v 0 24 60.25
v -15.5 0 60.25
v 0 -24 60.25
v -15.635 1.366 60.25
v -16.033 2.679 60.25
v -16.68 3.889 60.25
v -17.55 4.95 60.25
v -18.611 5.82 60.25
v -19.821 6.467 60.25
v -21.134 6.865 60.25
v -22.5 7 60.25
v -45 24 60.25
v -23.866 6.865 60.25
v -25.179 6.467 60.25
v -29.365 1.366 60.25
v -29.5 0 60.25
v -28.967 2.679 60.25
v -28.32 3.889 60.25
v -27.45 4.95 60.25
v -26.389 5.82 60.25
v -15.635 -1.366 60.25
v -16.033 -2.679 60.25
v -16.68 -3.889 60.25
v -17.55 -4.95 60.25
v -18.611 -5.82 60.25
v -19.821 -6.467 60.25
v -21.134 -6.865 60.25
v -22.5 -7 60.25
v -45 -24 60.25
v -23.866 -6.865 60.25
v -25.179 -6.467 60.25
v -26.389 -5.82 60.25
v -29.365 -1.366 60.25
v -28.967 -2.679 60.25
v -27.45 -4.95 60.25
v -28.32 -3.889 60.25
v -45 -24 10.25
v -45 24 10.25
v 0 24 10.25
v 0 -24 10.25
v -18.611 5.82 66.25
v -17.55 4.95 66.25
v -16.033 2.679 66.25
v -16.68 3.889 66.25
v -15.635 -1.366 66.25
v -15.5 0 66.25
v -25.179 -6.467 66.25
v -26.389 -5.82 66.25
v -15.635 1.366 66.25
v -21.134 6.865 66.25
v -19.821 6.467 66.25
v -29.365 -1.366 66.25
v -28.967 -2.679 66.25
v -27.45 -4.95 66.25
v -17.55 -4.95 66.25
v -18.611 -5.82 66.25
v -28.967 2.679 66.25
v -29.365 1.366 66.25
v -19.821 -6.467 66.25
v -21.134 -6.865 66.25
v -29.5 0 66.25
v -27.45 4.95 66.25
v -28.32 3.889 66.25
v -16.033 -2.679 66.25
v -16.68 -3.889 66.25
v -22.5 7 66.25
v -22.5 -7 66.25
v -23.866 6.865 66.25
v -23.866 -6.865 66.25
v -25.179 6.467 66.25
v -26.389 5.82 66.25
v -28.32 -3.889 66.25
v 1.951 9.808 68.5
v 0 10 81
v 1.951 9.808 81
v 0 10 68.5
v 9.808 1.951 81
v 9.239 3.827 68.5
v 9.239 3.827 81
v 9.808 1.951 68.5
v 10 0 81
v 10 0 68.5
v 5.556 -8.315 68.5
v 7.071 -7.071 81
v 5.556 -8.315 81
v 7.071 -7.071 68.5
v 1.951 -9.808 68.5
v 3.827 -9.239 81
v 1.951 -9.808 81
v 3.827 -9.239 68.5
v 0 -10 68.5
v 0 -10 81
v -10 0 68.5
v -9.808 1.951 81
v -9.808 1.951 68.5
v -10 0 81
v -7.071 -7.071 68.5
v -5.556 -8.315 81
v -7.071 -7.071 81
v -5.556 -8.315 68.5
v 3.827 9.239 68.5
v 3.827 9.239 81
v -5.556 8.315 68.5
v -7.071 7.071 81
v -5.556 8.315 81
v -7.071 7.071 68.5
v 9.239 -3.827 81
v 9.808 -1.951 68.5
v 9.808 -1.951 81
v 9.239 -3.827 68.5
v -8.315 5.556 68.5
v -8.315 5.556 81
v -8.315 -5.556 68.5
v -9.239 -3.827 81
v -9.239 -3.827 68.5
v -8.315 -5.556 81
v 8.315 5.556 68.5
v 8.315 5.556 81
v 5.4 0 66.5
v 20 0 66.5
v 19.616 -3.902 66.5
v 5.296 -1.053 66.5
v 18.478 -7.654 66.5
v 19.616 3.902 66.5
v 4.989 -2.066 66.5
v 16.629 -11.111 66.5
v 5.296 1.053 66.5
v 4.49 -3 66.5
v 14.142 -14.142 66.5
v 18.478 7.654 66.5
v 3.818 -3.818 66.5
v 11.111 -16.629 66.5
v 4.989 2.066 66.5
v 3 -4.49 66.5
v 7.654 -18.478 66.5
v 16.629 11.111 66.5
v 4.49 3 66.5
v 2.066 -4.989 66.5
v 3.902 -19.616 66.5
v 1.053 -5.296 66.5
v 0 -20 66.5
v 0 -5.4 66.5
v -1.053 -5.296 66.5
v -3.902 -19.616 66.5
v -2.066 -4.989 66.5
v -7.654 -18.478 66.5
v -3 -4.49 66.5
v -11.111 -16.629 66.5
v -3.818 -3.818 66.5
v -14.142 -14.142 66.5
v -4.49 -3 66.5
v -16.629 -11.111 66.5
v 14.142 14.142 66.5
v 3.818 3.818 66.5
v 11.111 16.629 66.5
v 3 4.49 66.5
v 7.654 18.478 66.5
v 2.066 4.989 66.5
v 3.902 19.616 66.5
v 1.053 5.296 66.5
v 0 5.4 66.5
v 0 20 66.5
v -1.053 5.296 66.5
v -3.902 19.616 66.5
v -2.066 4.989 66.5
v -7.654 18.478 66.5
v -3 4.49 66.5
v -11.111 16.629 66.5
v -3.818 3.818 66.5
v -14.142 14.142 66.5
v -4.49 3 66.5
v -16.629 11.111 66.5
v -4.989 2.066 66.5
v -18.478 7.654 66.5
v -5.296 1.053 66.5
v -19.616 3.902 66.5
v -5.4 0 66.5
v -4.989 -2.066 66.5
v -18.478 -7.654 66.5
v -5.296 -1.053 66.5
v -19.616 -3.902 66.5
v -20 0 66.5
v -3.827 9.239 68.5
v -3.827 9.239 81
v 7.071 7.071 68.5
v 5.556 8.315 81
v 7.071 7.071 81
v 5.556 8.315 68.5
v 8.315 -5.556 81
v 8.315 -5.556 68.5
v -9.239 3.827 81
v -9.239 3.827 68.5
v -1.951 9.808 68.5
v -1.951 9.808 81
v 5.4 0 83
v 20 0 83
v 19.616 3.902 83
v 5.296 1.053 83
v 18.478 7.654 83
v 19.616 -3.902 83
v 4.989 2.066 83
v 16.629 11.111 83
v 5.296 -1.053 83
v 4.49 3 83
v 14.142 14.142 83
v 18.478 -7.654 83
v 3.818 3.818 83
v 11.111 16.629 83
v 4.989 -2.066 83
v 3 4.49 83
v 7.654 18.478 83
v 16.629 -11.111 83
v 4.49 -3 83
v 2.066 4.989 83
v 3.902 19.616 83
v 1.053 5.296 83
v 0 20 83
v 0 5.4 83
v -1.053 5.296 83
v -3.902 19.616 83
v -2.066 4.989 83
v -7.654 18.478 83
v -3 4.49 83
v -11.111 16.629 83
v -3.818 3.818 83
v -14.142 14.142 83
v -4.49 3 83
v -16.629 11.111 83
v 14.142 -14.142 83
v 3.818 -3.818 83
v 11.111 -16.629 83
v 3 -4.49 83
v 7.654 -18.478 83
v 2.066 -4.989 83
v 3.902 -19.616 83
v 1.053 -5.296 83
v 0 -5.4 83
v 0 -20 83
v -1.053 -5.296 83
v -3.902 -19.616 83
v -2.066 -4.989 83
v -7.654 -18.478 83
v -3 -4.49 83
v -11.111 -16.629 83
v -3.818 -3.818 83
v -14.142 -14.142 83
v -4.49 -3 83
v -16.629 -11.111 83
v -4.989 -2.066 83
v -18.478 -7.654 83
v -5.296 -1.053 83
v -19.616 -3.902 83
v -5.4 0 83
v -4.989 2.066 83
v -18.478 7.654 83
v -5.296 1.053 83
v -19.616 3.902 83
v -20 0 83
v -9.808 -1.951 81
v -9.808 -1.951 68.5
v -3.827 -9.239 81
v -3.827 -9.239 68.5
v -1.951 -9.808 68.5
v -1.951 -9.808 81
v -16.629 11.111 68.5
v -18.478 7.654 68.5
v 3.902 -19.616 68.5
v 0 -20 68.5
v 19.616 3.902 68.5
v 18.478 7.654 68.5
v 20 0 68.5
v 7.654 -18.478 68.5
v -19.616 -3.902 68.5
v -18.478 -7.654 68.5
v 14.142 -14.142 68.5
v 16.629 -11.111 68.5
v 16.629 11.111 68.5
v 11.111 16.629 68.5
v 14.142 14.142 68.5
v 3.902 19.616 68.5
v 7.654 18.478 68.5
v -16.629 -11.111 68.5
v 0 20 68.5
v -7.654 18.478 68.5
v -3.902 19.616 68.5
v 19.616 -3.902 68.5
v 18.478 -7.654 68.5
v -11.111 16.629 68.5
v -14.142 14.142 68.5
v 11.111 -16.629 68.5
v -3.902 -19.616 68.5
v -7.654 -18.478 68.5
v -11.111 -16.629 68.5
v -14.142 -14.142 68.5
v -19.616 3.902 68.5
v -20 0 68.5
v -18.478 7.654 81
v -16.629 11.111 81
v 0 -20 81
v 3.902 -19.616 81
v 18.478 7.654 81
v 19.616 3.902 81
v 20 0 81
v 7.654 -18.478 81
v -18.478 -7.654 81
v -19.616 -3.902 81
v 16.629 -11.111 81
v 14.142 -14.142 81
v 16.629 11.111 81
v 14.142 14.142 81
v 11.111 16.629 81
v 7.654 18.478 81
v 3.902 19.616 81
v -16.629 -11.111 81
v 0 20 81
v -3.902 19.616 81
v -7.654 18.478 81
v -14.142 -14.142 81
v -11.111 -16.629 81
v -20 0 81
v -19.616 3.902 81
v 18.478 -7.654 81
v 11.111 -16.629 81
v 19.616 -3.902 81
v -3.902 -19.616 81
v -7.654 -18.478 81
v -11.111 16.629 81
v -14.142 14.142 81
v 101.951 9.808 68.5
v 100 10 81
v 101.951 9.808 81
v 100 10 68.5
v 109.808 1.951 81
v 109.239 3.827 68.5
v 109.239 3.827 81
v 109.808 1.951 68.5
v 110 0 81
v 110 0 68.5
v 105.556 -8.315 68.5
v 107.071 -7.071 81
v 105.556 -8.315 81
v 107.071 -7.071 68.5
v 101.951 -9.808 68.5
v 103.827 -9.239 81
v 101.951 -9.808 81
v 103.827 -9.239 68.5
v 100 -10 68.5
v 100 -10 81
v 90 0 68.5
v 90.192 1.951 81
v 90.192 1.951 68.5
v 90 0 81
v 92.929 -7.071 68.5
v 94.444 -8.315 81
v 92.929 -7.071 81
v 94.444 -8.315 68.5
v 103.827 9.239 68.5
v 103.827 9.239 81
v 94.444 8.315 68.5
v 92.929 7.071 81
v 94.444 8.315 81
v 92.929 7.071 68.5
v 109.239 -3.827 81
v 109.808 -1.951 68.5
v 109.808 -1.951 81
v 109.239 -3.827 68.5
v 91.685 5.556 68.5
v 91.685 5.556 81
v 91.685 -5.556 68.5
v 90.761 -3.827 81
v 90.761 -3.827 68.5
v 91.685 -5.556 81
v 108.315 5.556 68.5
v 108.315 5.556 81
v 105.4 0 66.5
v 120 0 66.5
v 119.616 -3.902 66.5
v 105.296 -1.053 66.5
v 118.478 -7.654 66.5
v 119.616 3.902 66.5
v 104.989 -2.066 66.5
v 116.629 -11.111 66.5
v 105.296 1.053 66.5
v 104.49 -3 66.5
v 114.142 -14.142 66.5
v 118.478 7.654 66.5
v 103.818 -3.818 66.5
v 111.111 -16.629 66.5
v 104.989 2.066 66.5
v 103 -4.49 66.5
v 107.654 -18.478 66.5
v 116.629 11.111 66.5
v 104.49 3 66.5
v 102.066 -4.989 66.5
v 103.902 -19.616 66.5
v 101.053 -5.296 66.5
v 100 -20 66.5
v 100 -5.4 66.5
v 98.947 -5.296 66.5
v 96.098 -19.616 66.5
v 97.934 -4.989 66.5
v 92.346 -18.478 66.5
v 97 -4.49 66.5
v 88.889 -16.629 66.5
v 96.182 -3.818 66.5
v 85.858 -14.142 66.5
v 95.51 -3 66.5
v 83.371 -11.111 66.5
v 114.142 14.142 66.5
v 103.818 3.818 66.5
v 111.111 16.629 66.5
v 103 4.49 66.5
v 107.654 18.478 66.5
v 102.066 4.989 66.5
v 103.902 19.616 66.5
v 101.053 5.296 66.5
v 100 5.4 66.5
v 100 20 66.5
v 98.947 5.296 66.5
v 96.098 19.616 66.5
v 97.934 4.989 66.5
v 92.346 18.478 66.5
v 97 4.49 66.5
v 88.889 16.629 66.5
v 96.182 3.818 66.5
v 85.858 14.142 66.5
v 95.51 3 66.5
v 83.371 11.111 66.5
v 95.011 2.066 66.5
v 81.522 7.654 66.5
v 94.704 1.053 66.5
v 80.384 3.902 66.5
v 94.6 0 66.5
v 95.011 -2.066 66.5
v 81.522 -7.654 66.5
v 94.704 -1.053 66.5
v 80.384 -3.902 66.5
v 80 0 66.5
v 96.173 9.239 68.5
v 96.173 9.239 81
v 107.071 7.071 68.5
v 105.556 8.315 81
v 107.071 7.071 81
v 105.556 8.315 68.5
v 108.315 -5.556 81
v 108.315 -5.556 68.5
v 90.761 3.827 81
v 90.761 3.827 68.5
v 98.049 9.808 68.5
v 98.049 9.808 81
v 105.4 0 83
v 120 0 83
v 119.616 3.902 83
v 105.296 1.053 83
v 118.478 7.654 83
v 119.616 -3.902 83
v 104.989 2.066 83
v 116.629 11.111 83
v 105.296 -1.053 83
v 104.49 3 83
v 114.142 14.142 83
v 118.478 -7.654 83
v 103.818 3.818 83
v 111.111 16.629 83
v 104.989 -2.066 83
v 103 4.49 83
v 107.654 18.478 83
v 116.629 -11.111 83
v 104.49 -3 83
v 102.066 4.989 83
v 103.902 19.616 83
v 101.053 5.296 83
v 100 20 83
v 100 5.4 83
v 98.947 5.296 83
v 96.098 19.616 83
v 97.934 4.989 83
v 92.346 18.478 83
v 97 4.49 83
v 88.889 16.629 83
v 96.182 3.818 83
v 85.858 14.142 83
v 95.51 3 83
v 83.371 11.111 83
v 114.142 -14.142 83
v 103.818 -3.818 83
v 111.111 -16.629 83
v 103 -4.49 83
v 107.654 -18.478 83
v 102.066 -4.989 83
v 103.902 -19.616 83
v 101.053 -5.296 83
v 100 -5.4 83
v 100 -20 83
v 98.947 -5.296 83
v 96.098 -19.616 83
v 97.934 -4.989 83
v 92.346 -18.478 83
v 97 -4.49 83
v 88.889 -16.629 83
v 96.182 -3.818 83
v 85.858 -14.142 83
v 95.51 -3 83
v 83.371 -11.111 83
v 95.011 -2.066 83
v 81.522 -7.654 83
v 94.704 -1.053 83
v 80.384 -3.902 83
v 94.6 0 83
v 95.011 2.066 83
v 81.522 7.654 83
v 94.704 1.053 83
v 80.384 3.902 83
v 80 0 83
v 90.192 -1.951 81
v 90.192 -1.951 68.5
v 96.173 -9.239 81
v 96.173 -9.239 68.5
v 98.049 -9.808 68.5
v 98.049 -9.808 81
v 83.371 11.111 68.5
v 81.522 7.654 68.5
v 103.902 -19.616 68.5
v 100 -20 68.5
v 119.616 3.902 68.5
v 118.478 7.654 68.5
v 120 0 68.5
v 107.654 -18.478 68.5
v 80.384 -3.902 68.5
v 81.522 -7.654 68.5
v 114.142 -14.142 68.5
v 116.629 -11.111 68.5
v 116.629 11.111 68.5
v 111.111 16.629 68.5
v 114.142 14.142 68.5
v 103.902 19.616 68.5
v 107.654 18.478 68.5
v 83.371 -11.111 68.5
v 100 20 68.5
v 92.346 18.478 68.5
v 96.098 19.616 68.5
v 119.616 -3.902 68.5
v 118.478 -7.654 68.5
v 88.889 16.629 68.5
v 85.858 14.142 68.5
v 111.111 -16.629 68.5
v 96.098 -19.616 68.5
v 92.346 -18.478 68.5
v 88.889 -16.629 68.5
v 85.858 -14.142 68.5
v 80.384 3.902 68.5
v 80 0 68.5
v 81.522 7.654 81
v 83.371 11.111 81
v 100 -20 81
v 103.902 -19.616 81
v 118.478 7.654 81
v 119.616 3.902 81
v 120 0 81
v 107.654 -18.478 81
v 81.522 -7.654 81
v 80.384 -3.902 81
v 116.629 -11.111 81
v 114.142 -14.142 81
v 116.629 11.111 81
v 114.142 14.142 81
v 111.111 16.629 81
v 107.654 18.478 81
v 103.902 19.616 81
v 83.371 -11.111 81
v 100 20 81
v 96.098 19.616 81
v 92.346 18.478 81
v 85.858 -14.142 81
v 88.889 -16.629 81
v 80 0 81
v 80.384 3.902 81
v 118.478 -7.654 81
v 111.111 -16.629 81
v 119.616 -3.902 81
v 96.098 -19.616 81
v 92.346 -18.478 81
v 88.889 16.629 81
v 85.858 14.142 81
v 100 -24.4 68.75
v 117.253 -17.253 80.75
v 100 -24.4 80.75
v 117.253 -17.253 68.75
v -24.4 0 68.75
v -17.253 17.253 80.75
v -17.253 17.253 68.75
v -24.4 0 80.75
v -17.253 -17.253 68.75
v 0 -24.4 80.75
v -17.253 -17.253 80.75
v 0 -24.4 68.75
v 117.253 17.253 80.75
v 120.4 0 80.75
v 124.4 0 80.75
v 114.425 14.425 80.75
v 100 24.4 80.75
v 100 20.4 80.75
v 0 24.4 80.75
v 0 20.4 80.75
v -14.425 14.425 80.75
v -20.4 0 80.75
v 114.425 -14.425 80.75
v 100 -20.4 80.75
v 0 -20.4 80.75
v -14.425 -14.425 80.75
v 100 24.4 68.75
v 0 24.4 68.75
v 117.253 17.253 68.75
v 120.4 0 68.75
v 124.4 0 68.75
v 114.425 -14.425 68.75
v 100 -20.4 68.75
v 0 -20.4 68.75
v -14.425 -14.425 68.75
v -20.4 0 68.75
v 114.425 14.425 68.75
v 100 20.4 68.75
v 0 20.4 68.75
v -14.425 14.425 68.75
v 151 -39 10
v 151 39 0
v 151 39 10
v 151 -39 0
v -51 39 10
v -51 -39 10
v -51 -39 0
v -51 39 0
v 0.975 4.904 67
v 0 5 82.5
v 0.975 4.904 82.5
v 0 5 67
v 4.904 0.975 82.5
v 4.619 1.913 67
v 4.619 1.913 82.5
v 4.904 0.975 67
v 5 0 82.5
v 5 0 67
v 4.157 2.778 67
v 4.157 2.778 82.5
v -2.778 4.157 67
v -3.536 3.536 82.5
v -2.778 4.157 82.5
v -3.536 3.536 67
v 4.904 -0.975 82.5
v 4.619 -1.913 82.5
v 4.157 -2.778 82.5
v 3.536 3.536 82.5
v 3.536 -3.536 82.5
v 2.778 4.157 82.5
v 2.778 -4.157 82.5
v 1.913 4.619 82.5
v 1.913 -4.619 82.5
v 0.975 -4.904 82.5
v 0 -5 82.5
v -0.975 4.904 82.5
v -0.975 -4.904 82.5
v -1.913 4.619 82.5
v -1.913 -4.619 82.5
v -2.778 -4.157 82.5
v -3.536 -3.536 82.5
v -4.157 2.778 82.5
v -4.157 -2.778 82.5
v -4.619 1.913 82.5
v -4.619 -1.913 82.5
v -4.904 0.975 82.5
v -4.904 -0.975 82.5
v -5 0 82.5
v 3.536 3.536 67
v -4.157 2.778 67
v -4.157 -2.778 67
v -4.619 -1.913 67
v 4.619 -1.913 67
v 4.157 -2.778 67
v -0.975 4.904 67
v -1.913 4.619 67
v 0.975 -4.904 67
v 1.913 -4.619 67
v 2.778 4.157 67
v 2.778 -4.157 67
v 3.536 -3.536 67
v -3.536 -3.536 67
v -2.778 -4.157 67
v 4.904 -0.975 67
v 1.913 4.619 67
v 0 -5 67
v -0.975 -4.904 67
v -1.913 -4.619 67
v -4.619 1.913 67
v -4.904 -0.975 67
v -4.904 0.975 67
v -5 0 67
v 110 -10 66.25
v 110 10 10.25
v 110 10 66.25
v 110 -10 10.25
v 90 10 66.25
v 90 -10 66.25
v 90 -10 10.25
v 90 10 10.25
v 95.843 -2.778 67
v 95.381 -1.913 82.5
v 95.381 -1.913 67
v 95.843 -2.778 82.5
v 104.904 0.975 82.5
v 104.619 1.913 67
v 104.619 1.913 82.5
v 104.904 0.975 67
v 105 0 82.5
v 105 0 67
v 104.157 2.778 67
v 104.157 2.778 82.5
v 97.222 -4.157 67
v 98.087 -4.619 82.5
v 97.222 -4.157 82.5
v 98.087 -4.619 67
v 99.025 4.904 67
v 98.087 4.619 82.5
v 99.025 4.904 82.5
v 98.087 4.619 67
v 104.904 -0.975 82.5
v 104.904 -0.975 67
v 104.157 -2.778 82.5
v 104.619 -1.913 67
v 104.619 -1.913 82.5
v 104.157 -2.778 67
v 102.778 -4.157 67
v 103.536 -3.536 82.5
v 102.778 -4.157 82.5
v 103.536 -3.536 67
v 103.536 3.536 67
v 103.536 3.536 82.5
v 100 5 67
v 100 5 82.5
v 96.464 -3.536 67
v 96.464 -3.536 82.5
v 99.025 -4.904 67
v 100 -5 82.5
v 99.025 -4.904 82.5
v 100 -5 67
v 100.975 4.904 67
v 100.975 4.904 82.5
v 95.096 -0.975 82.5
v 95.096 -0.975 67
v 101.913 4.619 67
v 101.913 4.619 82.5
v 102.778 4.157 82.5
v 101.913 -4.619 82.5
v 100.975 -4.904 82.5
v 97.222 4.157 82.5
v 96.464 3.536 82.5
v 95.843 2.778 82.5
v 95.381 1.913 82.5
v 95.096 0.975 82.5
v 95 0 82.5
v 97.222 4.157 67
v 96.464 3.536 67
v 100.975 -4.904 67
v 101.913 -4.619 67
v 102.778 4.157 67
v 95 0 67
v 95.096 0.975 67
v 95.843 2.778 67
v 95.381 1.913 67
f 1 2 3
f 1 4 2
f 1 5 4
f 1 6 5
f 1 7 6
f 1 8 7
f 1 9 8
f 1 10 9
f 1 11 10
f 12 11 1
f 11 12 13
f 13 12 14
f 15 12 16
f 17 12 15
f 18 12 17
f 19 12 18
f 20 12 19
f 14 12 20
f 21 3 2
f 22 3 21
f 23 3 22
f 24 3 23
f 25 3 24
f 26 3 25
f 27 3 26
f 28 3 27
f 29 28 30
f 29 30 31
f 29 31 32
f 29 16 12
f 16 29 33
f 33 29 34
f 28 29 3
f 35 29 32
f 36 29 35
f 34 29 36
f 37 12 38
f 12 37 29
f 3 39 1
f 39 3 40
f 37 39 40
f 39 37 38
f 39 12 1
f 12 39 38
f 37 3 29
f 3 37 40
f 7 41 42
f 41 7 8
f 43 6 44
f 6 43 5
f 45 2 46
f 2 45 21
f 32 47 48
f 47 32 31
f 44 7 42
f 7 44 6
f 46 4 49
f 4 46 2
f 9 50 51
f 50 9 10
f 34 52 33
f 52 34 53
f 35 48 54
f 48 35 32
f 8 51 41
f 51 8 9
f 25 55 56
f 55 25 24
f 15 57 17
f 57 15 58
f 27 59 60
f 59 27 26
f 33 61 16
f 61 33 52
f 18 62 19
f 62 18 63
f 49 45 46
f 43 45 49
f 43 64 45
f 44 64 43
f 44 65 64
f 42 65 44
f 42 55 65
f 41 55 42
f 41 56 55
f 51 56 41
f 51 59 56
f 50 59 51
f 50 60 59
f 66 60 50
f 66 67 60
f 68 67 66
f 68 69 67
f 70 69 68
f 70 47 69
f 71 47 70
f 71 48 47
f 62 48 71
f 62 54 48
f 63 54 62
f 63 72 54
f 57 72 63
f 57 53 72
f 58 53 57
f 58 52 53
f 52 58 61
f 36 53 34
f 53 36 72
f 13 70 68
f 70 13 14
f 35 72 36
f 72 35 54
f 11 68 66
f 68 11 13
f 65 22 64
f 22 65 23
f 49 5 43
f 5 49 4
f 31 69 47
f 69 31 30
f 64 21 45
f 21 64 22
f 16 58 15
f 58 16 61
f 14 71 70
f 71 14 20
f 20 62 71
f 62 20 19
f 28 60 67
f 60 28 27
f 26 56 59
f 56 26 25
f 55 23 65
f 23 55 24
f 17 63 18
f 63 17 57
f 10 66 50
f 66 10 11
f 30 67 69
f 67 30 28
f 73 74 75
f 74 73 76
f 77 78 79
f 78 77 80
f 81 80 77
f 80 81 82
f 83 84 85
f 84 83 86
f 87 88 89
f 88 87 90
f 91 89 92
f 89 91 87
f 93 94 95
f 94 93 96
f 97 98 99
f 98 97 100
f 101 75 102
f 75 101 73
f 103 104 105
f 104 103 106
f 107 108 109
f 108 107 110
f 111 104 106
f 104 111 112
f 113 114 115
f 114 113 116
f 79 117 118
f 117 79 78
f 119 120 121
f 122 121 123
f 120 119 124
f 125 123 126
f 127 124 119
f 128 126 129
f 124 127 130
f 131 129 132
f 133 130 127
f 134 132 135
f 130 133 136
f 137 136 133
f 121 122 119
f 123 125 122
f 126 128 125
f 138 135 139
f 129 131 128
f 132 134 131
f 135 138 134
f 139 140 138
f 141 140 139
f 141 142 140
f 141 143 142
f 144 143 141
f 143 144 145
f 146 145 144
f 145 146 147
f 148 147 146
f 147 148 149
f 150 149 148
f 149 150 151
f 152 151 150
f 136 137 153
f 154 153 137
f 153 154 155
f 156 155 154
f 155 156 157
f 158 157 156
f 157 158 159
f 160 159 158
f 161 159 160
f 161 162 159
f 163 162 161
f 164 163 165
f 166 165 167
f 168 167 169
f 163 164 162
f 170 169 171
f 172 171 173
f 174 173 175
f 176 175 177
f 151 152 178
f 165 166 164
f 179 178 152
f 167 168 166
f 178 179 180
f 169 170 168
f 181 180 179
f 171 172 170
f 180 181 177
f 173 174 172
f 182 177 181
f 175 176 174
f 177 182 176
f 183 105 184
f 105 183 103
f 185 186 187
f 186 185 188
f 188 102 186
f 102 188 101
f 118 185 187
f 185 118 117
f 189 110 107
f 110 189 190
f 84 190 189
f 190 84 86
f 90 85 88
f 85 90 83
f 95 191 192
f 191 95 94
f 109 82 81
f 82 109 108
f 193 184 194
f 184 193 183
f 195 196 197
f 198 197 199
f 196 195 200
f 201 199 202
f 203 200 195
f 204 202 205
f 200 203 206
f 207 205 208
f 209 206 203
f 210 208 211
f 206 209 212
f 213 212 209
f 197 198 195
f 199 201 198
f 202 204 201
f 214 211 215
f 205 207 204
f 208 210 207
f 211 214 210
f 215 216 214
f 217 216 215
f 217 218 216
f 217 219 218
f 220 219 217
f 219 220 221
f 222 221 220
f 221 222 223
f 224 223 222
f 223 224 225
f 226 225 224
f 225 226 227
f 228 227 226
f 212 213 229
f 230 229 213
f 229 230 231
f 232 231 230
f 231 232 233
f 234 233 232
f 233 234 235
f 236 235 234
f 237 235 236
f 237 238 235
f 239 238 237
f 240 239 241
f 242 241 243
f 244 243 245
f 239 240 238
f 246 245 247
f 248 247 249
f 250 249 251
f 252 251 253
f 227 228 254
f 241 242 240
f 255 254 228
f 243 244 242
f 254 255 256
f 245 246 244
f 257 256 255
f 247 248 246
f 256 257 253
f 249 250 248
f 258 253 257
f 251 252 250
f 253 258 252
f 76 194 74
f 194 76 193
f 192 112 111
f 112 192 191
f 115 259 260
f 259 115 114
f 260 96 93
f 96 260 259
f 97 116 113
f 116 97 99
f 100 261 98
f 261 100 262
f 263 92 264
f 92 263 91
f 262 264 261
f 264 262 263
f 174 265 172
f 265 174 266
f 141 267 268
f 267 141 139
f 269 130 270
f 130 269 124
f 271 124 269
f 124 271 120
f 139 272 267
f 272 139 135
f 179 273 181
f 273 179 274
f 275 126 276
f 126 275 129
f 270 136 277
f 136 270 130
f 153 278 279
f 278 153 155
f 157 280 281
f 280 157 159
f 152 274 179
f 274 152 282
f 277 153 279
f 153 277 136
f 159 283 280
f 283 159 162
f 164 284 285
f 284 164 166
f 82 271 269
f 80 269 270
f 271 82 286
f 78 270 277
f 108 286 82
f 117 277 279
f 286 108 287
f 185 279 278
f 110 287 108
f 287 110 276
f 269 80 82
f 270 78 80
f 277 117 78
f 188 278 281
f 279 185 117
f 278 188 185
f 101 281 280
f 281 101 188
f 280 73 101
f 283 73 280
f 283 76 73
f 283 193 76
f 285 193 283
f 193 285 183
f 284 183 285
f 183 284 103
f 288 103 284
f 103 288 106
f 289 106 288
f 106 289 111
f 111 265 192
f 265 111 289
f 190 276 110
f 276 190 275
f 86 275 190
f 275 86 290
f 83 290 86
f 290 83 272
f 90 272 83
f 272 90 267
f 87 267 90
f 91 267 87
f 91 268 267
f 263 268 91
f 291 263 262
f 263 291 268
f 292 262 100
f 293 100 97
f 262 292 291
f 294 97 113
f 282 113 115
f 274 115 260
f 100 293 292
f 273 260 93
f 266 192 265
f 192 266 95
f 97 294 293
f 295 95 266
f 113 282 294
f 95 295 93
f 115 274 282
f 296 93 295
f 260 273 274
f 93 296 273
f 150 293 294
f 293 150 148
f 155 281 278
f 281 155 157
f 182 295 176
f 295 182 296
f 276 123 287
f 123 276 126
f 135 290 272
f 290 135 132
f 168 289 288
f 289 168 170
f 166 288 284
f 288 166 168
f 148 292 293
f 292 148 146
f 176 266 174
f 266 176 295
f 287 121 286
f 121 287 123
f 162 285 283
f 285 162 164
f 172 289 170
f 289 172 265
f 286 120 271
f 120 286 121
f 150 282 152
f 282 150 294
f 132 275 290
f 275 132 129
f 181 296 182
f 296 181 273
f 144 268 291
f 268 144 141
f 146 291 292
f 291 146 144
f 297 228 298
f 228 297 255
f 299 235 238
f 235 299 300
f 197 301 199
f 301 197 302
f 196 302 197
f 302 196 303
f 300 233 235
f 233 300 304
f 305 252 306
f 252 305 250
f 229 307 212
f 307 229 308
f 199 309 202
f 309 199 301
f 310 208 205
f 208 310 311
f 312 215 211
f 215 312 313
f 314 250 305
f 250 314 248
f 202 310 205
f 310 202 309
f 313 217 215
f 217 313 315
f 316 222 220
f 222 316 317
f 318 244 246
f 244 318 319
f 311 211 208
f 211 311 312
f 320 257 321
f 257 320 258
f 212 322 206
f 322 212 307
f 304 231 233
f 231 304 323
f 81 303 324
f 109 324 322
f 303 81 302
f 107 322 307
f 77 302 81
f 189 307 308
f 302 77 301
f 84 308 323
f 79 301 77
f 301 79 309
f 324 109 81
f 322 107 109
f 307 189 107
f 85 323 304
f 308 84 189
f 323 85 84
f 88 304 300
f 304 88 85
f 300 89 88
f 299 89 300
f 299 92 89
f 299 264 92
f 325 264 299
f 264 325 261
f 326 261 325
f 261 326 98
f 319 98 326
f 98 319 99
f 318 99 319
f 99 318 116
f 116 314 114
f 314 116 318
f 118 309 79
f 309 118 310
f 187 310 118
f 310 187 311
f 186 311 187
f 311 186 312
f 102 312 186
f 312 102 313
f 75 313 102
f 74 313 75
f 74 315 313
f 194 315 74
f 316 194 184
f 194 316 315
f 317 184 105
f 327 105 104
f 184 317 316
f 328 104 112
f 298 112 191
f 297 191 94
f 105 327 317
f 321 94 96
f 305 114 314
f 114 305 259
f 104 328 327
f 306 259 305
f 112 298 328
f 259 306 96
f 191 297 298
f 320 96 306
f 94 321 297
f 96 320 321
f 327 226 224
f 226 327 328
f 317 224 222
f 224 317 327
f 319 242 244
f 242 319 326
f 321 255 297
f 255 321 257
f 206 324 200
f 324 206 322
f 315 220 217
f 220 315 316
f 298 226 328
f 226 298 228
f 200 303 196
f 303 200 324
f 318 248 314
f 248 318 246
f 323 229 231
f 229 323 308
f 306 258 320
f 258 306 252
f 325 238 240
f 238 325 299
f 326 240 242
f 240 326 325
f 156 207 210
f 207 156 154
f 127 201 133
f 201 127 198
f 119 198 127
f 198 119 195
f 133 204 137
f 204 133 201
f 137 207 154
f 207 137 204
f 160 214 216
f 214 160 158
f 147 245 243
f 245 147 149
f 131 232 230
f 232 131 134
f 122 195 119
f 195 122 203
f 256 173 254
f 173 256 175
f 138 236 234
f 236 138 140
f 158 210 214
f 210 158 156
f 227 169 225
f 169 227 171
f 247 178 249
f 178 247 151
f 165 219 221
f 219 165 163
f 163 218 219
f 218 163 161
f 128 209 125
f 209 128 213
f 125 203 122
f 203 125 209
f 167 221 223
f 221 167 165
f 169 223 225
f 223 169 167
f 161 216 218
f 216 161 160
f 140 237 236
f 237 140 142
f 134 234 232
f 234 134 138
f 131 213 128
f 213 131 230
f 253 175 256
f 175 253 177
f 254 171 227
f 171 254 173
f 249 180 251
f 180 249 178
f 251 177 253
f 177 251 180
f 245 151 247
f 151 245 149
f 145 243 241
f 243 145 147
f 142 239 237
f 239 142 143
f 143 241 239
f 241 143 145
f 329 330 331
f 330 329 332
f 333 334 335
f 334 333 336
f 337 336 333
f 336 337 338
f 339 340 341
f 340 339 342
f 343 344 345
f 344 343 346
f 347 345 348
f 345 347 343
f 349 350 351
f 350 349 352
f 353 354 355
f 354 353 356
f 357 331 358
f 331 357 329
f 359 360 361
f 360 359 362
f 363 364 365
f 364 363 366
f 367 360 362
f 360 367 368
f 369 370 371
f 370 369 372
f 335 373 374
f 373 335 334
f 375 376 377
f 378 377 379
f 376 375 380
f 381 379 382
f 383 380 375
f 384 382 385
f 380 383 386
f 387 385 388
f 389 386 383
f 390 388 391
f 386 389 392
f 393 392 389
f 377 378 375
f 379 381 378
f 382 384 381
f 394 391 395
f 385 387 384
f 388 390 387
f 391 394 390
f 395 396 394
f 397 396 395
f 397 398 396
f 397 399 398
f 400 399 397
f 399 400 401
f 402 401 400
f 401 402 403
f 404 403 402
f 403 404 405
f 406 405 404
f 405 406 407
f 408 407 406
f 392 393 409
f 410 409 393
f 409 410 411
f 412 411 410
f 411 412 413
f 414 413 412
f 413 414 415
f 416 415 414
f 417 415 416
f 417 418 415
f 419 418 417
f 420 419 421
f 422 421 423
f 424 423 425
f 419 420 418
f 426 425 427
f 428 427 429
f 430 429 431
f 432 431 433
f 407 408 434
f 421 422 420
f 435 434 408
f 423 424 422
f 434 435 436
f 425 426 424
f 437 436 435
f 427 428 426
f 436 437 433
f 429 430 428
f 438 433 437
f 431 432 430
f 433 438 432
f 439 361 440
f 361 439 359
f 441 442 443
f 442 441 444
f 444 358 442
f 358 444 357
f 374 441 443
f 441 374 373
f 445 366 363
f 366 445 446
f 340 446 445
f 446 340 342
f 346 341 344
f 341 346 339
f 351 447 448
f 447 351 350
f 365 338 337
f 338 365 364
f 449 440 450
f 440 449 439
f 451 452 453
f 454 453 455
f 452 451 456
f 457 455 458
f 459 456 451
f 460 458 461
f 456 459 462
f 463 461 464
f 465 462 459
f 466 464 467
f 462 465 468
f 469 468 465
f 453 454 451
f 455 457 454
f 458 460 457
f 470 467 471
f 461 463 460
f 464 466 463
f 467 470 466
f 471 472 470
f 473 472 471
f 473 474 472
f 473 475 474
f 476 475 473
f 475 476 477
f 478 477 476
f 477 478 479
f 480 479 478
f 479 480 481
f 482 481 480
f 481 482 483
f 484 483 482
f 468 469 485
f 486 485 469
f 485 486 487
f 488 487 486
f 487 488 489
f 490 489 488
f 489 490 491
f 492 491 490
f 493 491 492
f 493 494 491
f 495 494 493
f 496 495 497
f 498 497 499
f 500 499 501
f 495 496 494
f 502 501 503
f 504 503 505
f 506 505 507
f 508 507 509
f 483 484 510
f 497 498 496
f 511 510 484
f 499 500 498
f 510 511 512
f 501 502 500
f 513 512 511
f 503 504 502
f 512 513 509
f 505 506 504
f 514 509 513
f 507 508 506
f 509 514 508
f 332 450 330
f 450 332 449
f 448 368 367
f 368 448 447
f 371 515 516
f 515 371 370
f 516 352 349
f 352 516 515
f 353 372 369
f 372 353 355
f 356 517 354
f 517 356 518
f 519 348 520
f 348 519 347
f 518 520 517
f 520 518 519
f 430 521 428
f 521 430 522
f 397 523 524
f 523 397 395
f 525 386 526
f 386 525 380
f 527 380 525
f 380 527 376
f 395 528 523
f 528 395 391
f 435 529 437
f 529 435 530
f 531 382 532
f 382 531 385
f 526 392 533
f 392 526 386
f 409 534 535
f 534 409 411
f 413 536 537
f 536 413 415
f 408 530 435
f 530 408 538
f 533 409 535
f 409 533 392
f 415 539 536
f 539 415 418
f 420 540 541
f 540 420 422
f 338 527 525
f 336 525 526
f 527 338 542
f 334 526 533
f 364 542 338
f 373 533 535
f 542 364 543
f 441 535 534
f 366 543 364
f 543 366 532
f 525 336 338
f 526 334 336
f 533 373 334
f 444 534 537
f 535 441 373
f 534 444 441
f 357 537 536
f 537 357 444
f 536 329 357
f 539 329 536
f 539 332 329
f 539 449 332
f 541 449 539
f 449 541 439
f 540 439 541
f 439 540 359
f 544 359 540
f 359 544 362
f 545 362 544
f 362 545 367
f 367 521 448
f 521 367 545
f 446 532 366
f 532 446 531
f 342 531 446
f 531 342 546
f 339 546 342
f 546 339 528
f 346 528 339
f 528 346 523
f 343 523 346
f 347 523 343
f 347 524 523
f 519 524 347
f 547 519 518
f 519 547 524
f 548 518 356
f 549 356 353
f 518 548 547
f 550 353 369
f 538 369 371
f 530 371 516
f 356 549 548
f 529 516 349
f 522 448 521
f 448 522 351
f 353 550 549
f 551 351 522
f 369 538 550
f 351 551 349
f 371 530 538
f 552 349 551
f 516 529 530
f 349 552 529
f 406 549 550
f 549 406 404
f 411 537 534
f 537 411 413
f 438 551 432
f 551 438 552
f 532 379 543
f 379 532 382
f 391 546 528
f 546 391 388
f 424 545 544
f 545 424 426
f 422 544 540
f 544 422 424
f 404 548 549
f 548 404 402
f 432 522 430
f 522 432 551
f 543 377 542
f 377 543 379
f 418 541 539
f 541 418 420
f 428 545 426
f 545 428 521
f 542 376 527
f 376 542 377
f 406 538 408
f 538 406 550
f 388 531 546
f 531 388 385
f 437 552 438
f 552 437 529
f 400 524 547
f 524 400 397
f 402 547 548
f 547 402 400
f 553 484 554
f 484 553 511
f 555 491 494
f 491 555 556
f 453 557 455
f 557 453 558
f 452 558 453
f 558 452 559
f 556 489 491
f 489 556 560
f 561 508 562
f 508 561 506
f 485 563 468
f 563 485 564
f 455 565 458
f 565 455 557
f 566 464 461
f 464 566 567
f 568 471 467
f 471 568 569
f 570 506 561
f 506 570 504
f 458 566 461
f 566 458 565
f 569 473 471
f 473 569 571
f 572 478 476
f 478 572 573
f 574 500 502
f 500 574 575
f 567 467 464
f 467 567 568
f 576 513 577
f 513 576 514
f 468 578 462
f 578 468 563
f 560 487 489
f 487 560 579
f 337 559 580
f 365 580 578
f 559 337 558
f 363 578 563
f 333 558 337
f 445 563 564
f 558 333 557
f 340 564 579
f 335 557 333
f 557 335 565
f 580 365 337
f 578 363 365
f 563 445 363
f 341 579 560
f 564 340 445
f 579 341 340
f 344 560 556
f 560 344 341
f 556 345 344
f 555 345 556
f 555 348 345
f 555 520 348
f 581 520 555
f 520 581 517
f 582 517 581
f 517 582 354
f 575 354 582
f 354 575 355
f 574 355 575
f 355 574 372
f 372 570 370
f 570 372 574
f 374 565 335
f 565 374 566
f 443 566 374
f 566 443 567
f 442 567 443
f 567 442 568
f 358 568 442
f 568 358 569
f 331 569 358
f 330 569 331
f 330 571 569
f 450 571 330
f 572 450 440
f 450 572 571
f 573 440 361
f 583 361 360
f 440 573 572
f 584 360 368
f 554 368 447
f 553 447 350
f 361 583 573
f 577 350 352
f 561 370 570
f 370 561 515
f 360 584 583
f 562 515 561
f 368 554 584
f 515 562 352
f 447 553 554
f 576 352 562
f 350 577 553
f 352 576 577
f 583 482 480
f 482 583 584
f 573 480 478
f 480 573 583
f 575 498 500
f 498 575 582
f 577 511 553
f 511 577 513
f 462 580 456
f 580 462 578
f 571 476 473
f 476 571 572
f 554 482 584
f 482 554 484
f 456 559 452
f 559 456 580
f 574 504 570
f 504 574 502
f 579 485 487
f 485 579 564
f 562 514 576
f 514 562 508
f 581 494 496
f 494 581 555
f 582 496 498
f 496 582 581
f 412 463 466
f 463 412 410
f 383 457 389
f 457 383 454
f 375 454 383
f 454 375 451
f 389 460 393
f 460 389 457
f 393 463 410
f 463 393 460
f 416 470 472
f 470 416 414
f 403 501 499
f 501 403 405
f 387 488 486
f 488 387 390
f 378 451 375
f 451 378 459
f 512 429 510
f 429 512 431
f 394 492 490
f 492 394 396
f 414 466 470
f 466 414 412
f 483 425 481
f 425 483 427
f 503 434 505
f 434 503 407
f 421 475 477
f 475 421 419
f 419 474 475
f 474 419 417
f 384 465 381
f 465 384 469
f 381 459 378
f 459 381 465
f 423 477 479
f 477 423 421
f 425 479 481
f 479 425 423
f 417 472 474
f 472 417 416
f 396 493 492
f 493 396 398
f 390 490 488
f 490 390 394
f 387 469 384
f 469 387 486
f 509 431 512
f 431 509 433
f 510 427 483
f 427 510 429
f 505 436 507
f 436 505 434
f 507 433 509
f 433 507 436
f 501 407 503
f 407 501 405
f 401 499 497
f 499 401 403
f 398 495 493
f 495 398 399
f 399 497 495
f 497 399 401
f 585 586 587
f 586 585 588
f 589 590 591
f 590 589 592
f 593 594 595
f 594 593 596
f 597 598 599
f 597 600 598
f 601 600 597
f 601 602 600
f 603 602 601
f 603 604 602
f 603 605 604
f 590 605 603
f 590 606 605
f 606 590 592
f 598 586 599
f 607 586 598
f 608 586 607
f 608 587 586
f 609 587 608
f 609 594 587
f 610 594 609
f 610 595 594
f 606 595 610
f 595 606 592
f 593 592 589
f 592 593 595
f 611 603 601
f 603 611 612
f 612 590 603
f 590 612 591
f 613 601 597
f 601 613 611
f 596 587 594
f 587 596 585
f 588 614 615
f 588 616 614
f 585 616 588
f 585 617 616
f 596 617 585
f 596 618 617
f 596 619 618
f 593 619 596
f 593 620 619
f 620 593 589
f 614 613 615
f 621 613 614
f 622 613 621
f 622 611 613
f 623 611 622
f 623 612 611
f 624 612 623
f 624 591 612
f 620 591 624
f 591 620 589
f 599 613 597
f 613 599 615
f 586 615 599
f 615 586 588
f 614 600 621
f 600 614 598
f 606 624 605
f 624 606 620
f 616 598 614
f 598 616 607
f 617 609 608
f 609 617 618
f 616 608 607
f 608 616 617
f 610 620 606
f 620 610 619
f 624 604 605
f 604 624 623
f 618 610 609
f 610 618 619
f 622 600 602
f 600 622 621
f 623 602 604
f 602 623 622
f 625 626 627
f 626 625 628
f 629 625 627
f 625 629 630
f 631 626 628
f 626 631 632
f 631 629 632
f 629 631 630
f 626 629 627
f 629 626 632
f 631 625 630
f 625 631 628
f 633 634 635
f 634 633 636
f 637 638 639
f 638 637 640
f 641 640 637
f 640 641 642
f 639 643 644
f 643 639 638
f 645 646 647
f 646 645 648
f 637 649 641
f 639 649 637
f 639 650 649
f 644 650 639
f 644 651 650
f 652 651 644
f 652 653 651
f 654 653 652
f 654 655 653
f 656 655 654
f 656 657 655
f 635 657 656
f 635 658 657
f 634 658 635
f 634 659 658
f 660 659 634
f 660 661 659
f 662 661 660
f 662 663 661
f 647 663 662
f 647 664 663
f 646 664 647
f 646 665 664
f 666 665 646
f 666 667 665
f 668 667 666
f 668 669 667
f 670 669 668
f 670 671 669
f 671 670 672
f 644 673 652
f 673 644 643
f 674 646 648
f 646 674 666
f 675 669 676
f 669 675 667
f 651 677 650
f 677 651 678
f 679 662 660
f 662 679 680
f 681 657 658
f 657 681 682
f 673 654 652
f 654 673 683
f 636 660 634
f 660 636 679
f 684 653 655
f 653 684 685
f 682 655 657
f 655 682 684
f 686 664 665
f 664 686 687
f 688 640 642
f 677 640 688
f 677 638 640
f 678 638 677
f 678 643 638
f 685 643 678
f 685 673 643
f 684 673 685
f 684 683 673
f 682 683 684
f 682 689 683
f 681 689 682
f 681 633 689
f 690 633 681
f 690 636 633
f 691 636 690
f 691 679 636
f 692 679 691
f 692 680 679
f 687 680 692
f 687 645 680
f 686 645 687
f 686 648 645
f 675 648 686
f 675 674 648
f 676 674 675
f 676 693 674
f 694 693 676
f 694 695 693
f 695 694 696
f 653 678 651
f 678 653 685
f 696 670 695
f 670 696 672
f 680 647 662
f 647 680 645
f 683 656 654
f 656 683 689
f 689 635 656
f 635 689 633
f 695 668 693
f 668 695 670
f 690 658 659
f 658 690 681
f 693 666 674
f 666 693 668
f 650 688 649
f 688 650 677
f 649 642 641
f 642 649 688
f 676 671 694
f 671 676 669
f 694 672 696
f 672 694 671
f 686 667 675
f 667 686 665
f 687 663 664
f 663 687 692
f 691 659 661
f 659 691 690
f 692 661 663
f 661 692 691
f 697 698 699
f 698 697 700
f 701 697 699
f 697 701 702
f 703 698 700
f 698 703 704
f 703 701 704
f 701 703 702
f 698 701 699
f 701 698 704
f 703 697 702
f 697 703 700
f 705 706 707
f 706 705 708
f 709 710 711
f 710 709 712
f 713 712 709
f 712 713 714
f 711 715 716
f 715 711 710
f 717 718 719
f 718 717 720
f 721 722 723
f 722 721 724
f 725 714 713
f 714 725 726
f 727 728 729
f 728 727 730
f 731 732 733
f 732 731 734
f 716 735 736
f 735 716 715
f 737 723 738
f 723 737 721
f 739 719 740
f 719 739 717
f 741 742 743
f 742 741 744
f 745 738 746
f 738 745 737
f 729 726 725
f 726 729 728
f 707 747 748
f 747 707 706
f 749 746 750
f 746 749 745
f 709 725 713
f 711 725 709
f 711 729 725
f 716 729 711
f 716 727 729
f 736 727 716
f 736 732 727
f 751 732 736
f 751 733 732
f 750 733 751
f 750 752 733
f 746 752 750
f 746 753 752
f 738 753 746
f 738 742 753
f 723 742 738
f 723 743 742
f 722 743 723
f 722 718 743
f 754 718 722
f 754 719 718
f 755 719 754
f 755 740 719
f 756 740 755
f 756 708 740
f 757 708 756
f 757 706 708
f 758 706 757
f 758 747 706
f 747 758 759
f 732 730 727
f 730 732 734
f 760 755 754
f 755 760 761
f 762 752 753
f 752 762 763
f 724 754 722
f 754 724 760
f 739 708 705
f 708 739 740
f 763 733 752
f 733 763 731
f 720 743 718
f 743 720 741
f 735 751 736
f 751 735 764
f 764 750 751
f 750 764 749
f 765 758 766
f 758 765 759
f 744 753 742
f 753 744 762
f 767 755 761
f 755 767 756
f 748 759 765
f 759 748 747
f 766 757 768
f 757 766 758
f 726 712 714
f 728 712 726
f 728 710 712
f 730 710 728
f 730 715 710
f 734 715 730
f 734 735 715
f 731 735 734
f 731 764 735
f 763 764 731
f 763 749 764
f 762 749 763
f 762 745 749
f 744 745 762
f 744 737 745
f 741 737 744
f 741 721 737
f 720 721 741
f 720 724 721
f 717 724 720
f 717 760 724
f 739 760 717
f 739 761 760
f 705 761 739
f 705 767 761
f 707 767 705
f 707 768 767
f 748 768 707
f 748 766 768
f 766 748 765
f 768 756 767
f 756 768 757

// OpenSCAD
$fn = 32;

// ------------------------------------------------------------------------
// Motor belt drive: span 100 mm, pulleys d40, belt 12 mm wide
// Every part is its own module, assembly() places every instance.
// ------------------------------------------------------------------------

// --- part 1 ---
module base_plate() {
  difference() {
    translate([-101, -39, 0]) cube([202, 78, 10]);
  }
}

// --- part 2 ---
module motor() {
  union() {
    translate([-25, -24, 0]) cube([50, 48, 45]);
    translate([28, 0, 22.5]) rotate([0, 90, 0]) cylinder(h = 6, d = 14, center = true);
  }
}

// --- part 3 ---
module drive_shaft() {
  translate([0, 0, -7.75]) cylinder(h = 15.5, d = 10);
}

// --- part 4 ---
module pulley_drive() {
  difference() {
    union() {
      cylinder(h = 16.5, d = 20);
      cylinder(h = 2, d = 40);
      translate([0, 0, 14.5]) cylinder(h = 2, d = 40);
    }
    translate([0, 0, -1]) cylinder(h = 18.5, d = 10.8);
  }
}

// --- part 5 ---
module idler_post() {
  translate([-10, -10, 0]) cube([20, 20, 56]);
}

// --- part 6 ---
module driven_shaft() {
  translate([0, 0, -7.75]) cylinder(h = 15.5, d = 10);
}

// --- part 7 ---
module pulley_driven() {
  difference() {
    union() {
      cylinder(h = 16.5, d = 20);
      cylinder(h = 2, d = 40);
      translate([0, 0, 14.5]) cylinder(h = 2, d = 40);
    }
    translate([0, 0, -1]) cylinder(h = 18.5, d = 10.8);
  }
}

// --- part 8 ---
module drive_belt() {
  difference() {
    linear_extrude(height = 12) polygon(points = concat([for (a = [90 : 45 : 270]) [24.4 * cos(a), 24.4 * sin(a)]], [for (a = [270 : 45 : 450]) [100 + 24.4 * cos(a), 24.4 * sin(a)]]));
    translate([0, 0, -1]) linear_extrude(height = 14) polygon(points = concat([for (a = [90 : 45 : 270]) [20.4 * cos(a), 20.4 * sin(a)]], [for (a = [270 : 45 : 450]) [100 + 20.4 * cos(a), 20.4 * sin(a)]]));
  }
}

// --- assembly ---
module assembly() {
  color([0.80, 0.24, 0.20]) translate([50, 0, 0]) rotate([0, 0, 0]) base_plate();
  color([0.20, 0.45, 0.75]) translate([0, 0, 35.25]) rotate([0, 270, 0]) motor();
  color([0.25, 0.62, 0.32]) translate([0, 0, 74.75]) rotate([0, 0, 0]) drive_shaft();
  color([0.92, 0.70, 0.18]) translate([0, 0, 66.5]) rotate([0, 0, 0]) pulley_drive();
  color([0.58, 0.35, 0.70]) translate([100, 0, 10.25]) rotate([0, 0, 0]) idler_post();
  color([0.16, 0.66, 0.66]) translate([100, 0, 74.75]) rotate([0, 0, 0]) driven_shaft();
  color([0.85, 0.48, 0.18]) translate([100, 0, 66.5]) rotate([0, 0, 0]) pulley_driven();
  color([0.55, 0.60, 0.65]) translate([0, 0, 68.75]) rotate([0, 0, 0]) drive_belt();
}

assembly();
